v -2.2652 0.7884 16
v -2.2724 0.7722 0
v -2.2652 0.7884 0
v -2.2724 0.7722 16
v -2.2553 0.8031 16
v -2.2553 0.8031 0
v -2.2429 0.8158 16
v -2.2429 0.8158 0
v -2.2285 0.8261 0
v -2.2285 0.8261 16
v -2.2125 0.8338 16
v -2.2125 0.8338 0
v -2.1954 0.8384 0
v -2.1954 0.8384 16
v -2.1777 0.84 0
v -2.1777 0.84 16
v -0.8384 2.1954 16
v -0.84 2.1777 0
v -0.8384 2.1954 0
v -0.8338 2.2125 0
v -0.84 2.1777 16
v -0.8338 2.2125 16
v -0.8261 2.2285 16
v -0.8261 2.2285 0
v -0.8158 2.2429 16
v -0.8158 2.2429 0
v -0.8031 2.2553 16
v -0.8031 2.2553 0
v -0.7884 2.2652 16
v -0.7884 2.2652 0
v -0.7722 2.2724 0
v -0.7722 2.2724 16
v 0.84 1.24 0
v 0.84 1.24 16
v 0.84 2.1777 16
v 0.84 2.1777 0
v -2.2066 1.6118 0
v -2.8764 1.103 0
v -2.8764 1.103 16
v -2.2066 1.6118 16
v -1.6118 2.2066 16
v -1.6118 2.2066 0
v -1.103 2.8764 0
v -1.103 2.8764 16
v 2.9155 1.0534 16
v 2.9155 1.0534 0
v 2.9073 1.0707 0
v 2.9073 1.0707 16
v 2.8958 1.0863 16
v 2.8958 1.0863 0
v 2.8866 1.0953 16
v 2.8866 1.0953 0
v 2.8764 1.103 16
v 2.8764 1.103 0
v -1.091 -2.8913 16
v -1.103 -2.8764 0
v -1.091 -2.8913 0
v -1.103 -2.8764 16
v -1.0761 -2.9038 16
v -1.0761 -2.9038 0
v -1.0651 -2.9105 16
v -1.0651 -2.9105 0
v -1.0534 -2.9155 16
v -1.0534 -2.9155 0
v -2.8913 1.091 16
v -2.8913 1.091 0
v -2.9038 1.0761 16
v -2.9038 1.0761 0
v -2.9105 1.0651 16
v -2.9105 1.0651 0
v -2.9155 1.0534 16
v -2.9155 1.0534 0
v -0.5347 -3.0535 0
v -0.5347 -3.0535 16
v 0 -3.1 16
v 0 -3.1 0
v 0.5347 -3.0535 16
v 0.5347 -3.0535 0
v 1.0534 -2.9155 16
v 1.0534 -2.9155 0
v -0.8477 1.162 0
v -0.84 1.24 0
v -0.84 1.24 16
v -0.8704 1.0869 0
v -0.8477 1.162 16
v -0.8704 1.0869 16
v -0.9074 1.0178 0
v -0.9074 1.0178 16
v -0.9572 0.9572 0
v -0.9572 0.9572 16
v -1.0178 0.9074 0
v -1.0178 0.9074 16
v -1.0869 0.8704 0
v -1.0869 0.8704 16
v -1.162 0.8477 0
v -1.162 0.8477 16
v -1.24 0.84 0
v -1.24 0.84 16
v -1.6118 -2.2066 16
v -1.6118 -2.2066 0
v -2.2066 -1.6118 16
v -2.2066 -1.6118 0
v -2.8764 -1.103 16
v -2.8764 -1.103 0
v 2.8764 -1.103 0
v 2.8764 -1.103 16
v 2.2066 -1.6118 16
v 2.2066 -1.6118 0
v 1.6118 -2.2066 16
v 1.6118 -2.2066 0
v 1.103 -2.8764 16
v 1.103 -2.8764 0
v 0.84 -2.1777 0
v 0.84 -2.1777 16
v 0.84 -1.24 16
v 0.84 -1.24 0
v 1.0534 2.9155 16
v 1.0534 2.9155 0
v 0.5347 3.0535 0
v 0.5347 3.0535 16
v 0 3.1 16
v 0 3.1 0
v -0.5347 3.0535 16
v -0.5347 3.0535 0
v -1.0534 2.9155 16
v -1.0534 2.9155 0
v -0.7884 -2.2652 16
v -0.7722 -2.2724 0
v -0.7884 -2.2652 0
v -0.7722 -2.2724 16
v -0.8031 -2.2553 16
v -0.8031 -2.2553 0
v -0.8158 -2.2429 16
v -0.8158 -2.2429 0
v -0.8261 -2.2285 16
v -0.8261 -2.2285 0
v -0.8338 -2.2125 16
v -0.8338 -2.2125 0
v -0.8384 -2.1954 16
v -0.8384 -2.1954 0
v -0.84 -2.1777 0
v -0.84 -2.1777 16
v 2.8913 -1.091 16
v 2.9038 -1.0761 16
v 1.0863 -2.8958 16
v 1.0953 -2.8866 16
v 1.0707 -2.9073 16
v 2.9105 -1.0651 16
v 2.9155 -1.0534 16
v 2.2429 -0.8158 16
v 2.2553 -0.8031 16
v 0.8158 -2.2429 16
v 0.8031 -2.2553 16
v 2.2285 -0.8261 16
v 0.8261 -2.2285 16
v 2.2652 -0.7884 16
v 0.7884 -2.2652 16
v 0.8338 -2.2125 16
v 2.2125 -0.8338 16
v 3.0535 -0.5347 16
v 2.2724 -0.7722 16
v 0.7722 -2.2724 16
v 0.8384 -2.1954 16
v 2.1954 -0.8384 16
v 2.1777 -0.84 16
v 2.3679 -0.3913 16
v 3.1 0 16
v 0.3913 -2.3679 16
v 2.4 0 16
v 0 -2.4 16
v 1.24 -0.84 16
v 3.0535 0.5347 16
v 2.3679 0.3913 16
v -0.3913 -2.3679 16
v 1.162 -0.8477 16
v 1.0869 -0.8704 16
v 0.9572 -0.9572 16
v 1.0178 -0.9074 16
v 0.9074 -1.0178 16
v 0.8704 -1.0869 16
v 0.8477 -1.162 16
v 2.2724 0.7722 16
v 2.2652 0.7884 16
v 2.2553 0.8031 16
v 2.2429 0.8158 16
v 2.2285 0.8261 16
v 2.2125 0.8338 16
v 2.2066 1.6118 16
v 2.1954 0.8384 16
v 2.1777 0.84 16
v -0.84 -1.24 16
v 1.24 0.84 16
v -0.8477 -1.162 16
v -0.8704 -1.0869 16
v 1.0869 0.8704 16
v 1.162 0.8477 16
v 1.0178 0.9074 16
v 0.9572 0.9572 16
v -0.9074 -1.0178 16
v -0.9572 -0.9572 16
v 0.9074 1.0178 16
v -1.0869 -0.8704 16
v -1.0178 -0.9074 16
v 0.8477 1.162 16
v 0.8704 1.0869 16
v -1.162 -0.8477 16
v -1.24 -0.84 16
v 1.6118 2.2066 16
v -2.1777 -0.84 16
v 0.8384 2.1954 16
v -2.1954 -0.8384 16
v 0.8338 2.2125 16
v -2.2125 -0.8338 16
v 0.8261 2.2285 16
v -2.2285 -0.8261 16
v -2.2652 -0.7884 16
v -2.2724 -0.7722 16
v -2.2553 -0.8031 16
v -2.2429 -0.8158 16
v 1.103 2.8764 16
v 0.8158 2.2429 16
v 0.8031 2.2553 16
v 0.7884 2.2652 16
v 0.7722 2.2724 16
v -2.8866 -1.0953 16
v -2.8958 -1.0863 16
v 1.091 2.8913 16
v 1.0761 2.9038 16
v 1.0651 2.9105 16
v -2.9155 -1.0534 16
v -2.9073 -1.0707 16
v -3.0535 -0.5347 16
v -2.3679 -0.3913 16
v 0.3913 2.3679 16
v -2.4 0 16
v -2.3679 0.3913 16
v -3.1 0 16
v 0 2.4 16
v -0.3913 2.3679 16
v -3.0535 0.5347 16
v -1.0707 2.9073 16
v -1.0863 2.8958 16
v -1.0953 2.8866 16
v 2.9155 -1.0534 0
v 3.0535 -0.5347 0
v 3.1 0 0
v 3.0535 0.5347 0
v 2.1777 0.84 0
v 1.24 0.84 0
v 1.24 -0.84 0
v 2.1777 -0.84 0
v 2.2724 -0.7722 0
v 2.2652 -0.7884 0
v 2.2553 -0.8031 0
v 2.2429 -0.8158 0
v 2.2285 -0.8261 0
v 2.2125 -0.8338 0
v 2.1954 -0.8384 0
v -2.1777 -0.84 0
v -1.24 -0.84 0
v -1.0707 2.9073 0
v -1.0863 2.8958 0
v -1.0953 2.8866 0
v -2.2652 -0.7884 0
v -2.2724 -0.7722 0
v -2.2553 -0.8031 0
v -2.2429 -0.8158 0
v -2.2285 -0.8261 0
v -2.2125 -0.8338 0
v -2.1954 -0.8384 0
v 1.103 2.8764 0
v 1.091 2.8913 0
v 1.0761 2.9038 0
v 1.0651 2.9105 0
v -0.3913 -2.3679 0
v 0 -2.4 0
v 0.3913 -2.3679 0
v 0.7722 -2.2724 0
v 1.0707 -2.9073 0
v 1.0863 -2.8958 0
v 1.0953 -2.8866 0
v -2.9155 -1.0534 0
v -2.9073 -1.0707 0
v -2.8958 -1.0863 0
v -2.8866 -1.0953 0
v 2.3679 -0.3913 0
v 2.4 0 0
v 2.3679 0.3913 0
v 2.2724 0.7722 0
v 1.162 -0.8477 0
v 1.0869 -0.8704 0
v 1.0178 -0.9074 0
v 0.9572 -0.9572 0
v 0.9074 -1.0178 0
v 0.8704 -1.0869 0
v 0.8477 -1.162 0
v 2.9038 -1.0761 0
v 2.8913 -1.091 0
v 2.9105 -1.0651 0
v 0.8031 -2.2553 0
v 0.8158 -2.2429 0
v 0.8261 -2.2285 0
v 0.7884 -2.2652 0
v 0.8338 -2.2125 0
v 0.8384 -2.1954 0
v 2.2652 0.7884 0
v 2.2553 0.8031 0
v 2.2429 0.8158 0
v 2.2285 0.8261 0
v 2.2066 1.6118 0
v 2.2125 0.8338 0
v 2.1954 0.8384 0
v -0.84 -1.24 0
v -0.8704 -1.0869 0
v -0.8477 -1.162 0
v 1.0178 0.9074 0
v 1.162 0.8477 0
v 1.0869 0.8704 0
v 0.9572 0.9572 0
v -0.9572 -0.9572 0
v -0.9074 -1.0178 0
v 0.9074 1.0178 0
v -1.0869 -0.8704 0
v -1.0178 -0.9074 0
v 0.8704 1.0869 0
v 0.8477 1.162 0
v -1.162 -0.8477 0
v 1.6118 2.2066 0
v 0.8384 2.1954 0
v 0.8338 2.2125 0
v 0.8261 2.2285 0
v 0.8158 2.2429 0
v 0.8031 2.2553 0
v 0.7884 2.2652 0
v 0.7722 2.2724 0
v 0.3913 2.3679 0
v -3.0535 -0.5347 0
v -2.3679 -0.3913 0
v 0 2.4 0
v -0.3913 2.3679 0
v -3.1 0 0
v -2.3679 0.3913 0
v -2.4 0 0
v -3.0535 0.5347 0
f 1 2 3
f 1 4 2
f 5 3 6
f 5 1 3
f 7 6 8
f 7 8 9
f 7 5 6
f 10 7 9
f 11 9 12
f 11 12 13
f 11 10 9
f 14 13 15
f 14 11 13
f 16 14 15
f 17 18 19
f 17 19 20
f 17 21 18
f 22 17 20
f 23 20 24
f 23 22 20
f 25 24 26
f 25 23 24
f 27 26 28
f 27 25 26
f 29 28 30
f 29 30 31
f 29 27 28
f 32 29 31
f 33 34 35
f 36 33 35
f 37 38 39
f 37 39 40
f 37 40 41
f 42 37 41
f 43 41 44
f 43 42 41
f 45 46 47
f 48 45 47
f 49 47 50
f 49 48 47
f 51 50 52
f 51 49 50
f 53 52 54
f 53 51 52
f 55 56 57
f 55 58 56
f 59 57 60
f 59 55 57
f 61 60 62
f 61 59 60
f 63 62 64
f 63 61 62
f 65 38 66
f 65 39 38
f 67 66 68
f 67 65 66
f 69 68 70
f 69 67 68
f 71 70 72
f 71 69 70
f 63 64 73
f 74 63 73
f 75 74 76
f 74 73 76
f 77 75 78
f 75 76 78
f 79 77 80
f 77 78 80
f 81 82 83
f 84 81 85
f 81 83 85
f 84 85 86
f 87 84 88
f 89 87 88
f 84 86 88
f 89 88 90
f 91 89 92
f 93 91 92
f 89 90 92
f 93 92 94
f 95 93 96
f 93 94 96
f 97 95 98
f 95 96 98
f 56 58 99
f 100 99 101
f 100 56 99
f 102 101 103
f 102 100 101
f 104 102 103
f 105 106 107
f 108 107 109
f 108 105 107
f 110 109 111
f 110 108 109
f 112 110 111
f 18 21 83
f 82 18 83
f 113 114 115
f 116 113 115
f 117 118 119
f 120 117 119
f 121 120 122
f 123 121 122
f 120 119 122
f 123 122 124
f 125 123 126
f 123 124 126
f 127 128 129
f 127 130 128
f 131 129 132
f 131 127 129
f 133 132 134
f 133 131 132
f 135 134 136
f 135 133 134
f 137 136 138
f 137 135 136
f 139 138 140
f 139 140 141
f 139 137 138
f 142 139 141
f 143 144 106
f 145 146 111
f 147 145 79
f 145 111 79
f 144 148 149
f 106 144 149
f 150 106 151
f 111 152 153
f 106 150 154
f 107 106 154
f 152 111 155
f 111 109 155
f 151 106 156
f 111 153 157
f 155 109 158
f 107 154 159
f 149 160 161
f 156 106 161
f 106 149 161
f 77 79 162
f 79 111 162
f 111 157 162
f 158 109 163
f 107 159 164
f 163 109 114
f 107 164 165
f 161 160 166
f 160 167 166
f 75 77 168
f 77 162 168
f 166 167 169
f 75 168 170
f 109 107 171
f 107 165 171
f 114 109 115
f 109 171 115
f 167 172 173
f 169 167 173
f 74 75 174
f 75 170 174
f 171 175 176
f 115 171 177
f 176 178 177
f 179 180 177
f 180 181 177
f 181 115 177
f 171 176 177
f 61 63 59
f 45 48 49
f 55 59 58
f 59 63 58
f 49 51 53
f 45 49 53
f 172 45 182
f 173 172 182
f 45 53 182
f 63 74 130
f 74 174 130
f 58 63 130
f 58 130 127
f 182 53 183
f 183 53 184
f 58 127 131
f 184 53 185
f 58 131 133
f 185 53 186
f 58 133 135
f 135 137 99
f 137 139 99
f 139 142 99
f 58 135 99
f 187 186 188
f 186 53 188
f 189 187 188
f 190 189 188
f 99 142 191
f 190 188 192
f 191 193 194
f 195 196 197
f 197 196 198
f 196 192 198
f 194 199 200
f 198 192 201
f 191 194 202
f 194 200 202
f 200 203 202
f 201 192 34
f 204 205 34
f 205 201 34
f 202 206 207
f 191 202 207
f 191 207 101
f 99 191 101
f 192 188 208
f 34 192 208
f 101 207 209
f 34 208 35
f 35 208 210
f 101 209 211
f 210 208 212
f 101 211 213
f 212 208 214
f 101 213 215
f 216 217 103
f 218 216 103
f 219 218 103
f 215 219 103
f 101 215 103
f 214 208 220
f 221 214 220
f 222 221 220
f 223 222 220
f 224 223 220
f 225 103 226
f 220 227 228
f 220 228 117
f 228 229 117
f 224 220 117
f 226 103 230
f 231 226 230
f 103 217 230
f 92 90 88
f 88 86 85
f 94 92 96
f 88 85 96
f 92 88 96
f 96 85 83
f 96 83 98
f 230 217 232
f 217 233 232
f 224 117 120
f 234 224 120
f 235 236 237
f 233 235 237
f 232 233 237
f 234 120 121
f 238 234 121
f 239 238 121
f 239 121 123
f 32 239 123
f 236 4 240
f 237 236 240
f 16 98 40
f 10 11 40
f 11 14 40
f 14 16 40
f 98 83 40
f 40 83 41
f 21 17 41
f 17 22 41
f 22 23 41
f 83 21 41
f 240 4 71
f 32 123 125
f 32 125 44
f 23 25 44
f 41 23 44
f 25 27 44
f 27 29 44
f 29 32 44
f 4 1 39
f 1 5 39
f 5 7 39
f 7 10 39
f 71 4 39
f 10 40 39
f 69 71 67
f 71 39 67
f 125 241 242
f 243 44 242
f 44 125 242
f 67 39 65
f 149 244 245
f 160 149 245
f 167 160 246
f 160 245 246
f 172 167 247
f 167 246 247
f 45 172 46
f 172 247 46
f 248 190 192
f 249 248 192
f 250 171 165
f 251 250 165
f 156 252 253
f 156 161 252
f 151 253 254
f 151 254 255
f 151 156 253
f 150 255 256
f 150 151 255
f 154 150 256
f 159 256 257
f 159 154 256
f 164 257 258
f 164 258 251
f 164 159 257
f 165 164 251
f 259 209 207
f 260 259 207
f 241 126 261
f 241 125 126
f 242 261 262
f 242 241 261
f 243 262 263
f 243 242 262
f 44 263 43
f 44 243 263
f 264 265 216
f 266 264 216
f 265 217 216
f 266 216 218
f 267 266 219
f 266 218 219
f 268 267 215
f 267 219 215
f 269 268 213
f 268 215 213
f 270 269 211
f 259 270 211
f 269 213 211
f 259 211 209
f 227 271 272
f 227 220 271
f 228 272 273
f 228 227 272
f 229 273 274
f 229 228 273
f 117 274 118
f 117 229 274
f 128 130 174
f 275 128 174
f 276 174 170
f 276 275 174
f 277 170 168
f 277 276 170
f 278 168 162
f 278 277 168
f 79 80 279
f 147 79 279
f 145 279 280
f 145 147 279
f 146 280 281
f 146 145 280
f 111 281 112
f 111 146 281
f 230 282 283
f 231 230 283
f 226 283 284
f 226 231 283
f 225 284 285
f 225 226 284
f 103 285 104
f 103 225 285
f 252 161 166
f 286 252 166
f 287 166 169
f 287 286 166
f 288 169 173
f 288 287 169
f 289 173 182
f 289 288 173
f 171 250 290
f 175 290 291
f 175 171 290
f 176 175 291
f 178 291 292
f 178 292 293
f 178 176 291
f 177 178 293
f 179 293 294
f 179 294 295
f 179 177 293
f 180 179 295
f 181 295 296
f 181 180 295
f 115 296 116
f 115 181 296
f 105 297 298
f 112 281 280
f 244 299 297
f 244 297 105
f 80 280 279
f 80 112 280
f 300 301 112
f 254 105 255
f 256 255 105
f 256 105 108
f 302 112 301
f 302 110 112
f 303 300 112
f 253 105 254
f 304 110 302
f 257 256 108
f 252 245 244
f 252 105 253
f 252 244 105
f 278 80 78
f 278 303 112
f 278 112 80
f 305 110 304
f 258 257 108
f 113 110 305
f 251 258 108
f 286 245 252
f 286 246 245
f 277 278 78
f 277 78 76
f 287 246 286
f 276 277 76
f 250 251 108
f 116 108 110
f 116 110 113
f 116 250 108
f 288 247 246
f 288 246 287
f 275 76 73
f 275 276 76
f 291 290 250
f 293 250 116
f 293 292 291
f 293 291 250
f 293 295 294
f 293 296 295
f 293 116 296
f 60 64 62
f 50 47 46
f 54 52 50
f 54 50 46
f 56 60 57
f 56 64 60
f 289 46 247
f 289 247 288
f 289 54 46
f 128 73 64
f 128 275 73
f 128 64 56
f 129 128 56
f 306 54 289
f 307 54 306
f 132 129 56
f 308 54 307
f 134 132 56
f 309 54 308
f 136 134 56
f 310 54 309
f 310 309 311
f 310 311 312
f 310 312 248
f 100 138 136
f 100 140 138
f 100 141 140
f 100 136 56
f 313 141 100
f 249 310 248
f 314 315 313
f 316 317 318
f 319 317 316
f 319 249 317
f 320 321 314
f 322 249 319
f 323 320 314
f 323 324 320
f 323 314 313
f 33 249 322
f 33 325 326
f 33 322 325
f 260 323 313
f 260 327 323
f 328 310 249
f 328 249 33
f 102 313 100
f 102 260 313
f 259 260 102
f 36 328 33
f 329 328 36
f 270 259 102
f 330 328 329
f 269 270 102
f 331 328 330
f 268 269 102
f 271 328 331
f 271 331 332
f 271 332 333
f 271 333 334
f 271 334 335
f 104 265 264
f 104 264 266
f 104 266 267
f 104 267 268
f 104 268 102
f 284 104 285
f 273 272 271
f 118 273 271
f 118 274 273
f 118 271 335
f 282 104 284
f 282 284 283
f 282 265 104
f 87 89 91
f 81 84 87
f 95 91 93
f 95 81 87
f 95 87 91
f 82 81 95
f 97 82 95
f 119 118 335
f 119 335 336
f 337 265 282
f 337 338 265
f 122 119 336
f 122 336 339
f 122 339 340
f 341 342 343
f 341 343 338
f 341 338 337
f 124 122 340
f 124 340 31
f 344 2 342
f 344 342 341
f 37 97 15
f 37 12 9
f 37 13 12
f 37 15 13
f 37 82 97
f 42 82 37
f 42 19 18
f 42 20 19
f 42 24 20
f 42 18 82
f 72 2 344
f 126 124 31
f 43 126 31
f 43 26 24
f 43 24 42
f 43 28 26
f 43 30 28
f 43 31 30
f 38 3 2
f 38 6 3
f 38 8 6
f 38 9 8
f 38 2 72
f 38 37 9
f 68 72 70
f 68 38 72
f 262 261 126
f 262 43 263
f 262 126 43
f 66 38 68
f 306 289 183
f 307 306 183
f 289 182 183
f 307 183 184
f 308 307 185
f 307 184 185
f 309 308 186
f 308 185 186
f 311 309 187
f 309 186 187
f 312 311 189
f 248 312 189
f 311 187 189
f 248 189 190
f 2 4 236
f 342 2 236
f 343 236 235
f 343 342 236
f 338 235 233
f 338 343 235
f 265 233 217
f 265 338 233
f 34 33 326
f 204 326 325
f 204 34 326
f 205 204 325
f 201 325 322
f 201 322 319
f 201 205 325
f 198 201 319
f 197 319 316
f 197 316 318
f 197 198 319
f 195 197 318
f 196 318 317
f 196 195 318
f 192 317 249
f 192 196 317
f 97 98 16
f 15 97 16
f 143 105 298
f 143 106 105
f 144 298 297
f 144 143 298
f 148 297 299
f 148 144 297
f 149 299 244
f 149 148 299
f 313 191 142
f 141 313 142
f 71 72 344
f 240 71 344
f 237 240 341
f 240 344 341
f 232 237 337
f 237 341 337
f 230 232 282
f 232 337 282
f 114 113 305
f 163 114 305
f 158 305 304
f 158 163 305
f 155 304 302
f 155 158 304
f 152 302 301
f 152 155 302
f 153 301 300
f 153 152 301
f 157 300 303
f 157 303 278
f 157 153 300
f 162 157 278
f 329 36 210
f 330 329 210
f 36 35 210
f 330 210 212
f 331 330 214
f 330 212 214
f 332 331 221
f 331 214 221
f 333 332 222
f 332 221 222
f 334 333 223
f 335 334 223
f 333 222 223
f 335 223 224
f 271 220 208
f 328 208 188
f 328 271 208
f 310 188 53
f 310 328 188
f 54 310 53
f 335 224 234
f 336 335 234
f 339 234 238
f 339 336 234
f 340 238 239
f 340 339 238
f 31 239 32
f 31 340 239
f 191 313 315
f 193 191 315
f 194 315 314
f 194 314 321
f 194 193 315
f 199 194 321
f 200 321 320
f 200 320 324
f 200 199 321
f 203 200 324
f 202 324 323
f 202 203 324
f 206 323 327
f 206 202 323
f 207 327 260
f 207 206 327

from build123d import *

# Parameters (mm, degrees)
BOSS_EXTRUDE1_DEPTH = 16
CUT_EXTRUDE1_DEPTH  = 16
FILLET1_R           = 0.4
FILLET2_R           = 0.4
FILLET3_R           = 0.4
FILLET4_R           = 0.4
FILLET5_R           = 6.2
FILLET6_R           = 6.2
FILLET7_R           = 6.2
FILLET8_R           = 6.2
FILLET9_R           = 0.1
FILLET10_R          = 0.1
FILLET11_R          = 0.1
FILLET12_R          = 0.1
FILLET13_R          = 0.1
FILLET14_R          = 0.1
FILLET15_R          = 0.1
FILLET16_R          = 0.1
FILLET17_R          = 0.1
FILLET18_R          = 0.1
FILLET19_R          = 0.1
FILLET20_R          = 0.1
FILLET21_R          = 0.1
FILLET22_R          = 0.1
FILLET23_R          = 0.1
FILLET24_R          = 0.1


with BuildPart() as part:
    # Sketch1 → Boss-Extrude1 (new body)
    with BuildSketch(Plane.XY):
        with BuildLine():
            Line((-1.085, -1.085), (-1.085, -2.903924069))
            ThreePointArc((-1.085, -2.903924069), (0, -3.1), (1.085, -2.903924069))
            Line((1.085, -2.903924069), (1.085, -1.085))
            Line((1.085, -1.085), (2.903924069, -1.085))
            ThreePointArc((2.903924069, -1.085), (3.1, 0), (2.903924069, 1.085))
            Line((2.903924069, 1.085), (1.085, 1.085))
            Line((1.085, 1.085), (1.085, 2.903924069))
            ThreePointArc((1.085, 2.903924069), (0, 3.1), (-1.085, 2.903924069))
            Line((-1.085, 2.903924069), (-1.085, 1.085))
            Line((-1.085, 1.085), (-2.903924069, 1.085))
            ThreePointArc((-2.903924069, 1.085), (-3.1, 0), (-2.903924069, -1.085))
            Line((-2.903924069, -1.085), (-1.085, -1.085))
        make_face()
    extrude(amount=BOSS_EXTRUDE1_DEPTH)

    # Sketch2 → Cut-Extrude1 (cut)
    with BuildSketch(Plane.XY):
        with BuildLine():
            Line((0.84, -0.84), (2.248199279, -0.84))
            ThreePointArc((2.248199279, -0.84), (2.4, 0), (2.248199279, 0.84))
            Line((2.248199279, 0.84), (0.84, 0.84))
            Line((0.84, 0.84), (0.84, 2.248199279))
            ThreePointArc((0.84, 2.248199279), (0, 2.4), (-0.84, 2.248199279))
            Line((-0.84, 2.248199279), (-0.84, 0.84))
            Line((-0.84, 0.84), (-2.248199279, 0.84))
            ThreePointArc((-2.248199279, 0.84), (-2.4, 0), (-2.248199279, -0.84))
            Line((-2.248199279, -0.84), (-0.84, -0.84))
            Line((-0.84, -0.84), (-0.84, -2.248199279))
            ThreePointArc((-0.84, -2.248199279), (0, -2.4), (0.84, -2.248199279))
            Line((0.84, -2.248199279), (0.84, -0.84))
        make_face()
    extrude(amount=CUT_EXTRUDE1_DEPTH, mode=Mode.SUBTRACT)

    # Fillet1
    fillet1_edges = [part.edges().sort_by_distance(p)[0] for p in [
        (-0.84, 0.84, 8),
    ]]
    fillet(fillet1_edges, radius=FILLET1_R)

    # Fillet2
    fillet2_edges = [part.edges().sort_by_distance(p)[0] for p in [
        (0.84, 0.84, 8),
    ]]
    fillet(fillet2_edges, radius=FILLET2_R)

    # Fillet3
    fillet3_edges = [part.edges().sort_by_distance(p)[0] for p in [
        (0.84, -0.84, 8),
    ]]
    fillet(fillet3_edges, radius=FILLET3_R)

    # Fillet4
    fillet4_edges = [part.edges().sort_by_distance(p)[0] for p in [
        (-0.84, -0.84, 8),
    ]]
    fillet(fillet4_edges, radius=FILLET4_R)

    # Fillet5
    # the kernel refuses this fillet: 6.2 mm, written as the material it adds along each edge
    with BuildSketch(Plane(origin=(-1.085, 1.085, 0), x_dir=(-1, 0, 0), z_dir=(0, 0, 1))) as fillet5_piece_1:
        with BuildLine():
            CenterArc((5.198154004, -5.198154004), FILLET5_R, 123.027198012, 23.945603977)
            Line((0, -1.818924069), (0, 0))
            Line((0, 0), (1.818924069, 0))
        make_face()
    extrude(amount=16)

    # Fillet6
    # the kernel refuses this fillet: 6.2 mm, written as the material it adds along each edge
    with BuildSketch(Plane(origin=(-1.085, -1.085, 0), x_dir=(-1, 0, 0), z_dir=(0, 0, 1))) as fillet6_piece_1:
        with BuildLine():
            CenterArc((5.198154004, 5.198154004), FILLET6_R, 213.027198012, 23.945603977)
            Line((0, 1.818924069), (0, 0))
            Line((0, 0), (1.818924069, 0))
        make_face()
    extrude(amount=16)

    # Fillet7
    # the kernel refuses this fillet: 6.2 mm, written as the material it adds along each edge
    with BuildSketch(Plane(origin=(1.085, -1.085, 0), x_dir=(0, -1, 0), z_dir=(0, 0, 1))) as fillet7_piece_1:
        with BuildLine():
            CenterArc((5.198154004, 5.198154004), FILLET7_R, 213.027198012, 23.945603977)
            Line((0, 1.818924069), (0, 0))
            Line((0, 0), (1.818924069, 0))
        make_face()
    extrude(amount=16)

    # Fillet8
    # the kernel refuses this fillet: 6.2 mm, written as the material it adds along each edge
    with BuildSketch(Plane(origin=(1.085, 1.085, 0), x_dir=(1, 0, 0), z_dir=(0, 0, 1))) as fillet8_piece_1:
        with BuildLine():
            CenterArc((5.198154004, 5.198154004), FILLET8_R, 213.027198012, 23.945603977)
            Line((0, 1.818924069), (0, 0))
            Line((0, 0), (1.818924069, 0))
        make_face()
    extrude(amount=16)

    # Fillet9
    fillet9_edges = [part.edges().sort_by_distance(p)[0] for p in [
        (0.84, 2.248199279, 8),
    ]]
    fillet(fillet9_edges, radius=FILLET9_R)

    # Fillet10
    fillet10_edges = [part.edges().sort_by_distance(p)[0] for p in [
        (1.085, 2.903924069, 8),
    ]]
    fillet(fillet10_edges, radius=FILLET10_R)

    # Fillet11
    fillet11_edges = [part.edges().sort_by_distance(p)[0] for p in [
        (-1.085, 2.903924069, 8),
    ]]
    fillet(fillet11_edges, radius=FILLET11_R)

    # Fillet12
    fillet12_edges = [part.edges().sort_by_distance(p)[0] for p in [
        (-2.903924069, 1.085, 8),
    ]]
    fillet(fillet12_edges, radius=FILLET12_R)

    # Fillet13
    fillet13_edges = [part.edges().sort_by_distance(p)[0] for p in [
        (-2.903924069, -1.085, 8),
    ]]
    fillet(fillet13_edges, radius=FILLET13_R)

    # Fillet14
    fillet14_edges = [part.edges().sort_by_distance(p)[0] for p in [
        (-1.085, -2.903924069, 8),
    ]]
    fillet(fillet14_edges, radius=FILLET14_R)

    # Fillet15
    fillet15_edges = [part.edges().sort_by_distance(p)[0] for p in [
        (1.085, -2.903924069, 8),
    ]]
    fillet(fillet15_edges, radius=FILLET15_R)

    # Fillet16
    fillet16_edges = [part.edges().sort_by_distance(p)[0] for p in [
        (2.903924069, -1.085, 8),
    ]]
    fillet(fillet16_edges, radius=FILLET16_R)

    # Fillet17
    fillet17_edges = [part.edges().sort_by_distance(p)[0] for p in [
        (2.903924069, 1.085, 8),
    ]]
    fillet(fillet17_edges, radius=FILLET17_R)

    # Fillet18
    fillet18_edges = [part.edges().sort_by_distance(p)[0] for p in [
        (0.84, -2.248199279, 8),
    ]]
    fillet(fillet18_edges, radius=FILLET18_R)

    # Fillet19
    fillet19_edges = [part.edges().sort_by_distance(p)[0] for p in [
        (-0.84, -2.248199279, 8),
    ]]
    fillet(fillet19_edges, radius=FILLET19_R)

    # Fillet20
    fillet20_edges = [part.edges().sort_by_distance(p)[0] for p in [
        (-2.248199279, 0.84, 8),
    ]]
    fillet(fillet20_edges, radius=FILLET20_R)

    # Fillet21
    fillet21_edges = [part.edges().sort_by_distance(p)[0] for p in [
        (-2.248199279, -0.84, 8),
    ]]
    fillet(fillet21_edges, radius=FILLET21_R)

    # Fillet22
    fillet22_edges = [part.edges().sort_by_distance(p)[0] for p in [
        (-0.84, 2.248199279, 8),
    ]]
    fillet(fillet22_edges, radius=FILLET22_R)

    # Fillet23
    fillet23_edges = [part.edges().sort_by_distance(p)[0] for p in [
        (2.248199279, -0.84, 8),
    ]]
    fillet(fillet23_edges, radius=FILLET23_R)

    # Fillet24
    fillet24_edges = [part.edges().sort_by_distance(p)[0] for p in [
        (2.248199279, 0.84, 8),
    ]]
    fillet(fillet24_edges, radius=FILLET24_R)


solid = part.part
